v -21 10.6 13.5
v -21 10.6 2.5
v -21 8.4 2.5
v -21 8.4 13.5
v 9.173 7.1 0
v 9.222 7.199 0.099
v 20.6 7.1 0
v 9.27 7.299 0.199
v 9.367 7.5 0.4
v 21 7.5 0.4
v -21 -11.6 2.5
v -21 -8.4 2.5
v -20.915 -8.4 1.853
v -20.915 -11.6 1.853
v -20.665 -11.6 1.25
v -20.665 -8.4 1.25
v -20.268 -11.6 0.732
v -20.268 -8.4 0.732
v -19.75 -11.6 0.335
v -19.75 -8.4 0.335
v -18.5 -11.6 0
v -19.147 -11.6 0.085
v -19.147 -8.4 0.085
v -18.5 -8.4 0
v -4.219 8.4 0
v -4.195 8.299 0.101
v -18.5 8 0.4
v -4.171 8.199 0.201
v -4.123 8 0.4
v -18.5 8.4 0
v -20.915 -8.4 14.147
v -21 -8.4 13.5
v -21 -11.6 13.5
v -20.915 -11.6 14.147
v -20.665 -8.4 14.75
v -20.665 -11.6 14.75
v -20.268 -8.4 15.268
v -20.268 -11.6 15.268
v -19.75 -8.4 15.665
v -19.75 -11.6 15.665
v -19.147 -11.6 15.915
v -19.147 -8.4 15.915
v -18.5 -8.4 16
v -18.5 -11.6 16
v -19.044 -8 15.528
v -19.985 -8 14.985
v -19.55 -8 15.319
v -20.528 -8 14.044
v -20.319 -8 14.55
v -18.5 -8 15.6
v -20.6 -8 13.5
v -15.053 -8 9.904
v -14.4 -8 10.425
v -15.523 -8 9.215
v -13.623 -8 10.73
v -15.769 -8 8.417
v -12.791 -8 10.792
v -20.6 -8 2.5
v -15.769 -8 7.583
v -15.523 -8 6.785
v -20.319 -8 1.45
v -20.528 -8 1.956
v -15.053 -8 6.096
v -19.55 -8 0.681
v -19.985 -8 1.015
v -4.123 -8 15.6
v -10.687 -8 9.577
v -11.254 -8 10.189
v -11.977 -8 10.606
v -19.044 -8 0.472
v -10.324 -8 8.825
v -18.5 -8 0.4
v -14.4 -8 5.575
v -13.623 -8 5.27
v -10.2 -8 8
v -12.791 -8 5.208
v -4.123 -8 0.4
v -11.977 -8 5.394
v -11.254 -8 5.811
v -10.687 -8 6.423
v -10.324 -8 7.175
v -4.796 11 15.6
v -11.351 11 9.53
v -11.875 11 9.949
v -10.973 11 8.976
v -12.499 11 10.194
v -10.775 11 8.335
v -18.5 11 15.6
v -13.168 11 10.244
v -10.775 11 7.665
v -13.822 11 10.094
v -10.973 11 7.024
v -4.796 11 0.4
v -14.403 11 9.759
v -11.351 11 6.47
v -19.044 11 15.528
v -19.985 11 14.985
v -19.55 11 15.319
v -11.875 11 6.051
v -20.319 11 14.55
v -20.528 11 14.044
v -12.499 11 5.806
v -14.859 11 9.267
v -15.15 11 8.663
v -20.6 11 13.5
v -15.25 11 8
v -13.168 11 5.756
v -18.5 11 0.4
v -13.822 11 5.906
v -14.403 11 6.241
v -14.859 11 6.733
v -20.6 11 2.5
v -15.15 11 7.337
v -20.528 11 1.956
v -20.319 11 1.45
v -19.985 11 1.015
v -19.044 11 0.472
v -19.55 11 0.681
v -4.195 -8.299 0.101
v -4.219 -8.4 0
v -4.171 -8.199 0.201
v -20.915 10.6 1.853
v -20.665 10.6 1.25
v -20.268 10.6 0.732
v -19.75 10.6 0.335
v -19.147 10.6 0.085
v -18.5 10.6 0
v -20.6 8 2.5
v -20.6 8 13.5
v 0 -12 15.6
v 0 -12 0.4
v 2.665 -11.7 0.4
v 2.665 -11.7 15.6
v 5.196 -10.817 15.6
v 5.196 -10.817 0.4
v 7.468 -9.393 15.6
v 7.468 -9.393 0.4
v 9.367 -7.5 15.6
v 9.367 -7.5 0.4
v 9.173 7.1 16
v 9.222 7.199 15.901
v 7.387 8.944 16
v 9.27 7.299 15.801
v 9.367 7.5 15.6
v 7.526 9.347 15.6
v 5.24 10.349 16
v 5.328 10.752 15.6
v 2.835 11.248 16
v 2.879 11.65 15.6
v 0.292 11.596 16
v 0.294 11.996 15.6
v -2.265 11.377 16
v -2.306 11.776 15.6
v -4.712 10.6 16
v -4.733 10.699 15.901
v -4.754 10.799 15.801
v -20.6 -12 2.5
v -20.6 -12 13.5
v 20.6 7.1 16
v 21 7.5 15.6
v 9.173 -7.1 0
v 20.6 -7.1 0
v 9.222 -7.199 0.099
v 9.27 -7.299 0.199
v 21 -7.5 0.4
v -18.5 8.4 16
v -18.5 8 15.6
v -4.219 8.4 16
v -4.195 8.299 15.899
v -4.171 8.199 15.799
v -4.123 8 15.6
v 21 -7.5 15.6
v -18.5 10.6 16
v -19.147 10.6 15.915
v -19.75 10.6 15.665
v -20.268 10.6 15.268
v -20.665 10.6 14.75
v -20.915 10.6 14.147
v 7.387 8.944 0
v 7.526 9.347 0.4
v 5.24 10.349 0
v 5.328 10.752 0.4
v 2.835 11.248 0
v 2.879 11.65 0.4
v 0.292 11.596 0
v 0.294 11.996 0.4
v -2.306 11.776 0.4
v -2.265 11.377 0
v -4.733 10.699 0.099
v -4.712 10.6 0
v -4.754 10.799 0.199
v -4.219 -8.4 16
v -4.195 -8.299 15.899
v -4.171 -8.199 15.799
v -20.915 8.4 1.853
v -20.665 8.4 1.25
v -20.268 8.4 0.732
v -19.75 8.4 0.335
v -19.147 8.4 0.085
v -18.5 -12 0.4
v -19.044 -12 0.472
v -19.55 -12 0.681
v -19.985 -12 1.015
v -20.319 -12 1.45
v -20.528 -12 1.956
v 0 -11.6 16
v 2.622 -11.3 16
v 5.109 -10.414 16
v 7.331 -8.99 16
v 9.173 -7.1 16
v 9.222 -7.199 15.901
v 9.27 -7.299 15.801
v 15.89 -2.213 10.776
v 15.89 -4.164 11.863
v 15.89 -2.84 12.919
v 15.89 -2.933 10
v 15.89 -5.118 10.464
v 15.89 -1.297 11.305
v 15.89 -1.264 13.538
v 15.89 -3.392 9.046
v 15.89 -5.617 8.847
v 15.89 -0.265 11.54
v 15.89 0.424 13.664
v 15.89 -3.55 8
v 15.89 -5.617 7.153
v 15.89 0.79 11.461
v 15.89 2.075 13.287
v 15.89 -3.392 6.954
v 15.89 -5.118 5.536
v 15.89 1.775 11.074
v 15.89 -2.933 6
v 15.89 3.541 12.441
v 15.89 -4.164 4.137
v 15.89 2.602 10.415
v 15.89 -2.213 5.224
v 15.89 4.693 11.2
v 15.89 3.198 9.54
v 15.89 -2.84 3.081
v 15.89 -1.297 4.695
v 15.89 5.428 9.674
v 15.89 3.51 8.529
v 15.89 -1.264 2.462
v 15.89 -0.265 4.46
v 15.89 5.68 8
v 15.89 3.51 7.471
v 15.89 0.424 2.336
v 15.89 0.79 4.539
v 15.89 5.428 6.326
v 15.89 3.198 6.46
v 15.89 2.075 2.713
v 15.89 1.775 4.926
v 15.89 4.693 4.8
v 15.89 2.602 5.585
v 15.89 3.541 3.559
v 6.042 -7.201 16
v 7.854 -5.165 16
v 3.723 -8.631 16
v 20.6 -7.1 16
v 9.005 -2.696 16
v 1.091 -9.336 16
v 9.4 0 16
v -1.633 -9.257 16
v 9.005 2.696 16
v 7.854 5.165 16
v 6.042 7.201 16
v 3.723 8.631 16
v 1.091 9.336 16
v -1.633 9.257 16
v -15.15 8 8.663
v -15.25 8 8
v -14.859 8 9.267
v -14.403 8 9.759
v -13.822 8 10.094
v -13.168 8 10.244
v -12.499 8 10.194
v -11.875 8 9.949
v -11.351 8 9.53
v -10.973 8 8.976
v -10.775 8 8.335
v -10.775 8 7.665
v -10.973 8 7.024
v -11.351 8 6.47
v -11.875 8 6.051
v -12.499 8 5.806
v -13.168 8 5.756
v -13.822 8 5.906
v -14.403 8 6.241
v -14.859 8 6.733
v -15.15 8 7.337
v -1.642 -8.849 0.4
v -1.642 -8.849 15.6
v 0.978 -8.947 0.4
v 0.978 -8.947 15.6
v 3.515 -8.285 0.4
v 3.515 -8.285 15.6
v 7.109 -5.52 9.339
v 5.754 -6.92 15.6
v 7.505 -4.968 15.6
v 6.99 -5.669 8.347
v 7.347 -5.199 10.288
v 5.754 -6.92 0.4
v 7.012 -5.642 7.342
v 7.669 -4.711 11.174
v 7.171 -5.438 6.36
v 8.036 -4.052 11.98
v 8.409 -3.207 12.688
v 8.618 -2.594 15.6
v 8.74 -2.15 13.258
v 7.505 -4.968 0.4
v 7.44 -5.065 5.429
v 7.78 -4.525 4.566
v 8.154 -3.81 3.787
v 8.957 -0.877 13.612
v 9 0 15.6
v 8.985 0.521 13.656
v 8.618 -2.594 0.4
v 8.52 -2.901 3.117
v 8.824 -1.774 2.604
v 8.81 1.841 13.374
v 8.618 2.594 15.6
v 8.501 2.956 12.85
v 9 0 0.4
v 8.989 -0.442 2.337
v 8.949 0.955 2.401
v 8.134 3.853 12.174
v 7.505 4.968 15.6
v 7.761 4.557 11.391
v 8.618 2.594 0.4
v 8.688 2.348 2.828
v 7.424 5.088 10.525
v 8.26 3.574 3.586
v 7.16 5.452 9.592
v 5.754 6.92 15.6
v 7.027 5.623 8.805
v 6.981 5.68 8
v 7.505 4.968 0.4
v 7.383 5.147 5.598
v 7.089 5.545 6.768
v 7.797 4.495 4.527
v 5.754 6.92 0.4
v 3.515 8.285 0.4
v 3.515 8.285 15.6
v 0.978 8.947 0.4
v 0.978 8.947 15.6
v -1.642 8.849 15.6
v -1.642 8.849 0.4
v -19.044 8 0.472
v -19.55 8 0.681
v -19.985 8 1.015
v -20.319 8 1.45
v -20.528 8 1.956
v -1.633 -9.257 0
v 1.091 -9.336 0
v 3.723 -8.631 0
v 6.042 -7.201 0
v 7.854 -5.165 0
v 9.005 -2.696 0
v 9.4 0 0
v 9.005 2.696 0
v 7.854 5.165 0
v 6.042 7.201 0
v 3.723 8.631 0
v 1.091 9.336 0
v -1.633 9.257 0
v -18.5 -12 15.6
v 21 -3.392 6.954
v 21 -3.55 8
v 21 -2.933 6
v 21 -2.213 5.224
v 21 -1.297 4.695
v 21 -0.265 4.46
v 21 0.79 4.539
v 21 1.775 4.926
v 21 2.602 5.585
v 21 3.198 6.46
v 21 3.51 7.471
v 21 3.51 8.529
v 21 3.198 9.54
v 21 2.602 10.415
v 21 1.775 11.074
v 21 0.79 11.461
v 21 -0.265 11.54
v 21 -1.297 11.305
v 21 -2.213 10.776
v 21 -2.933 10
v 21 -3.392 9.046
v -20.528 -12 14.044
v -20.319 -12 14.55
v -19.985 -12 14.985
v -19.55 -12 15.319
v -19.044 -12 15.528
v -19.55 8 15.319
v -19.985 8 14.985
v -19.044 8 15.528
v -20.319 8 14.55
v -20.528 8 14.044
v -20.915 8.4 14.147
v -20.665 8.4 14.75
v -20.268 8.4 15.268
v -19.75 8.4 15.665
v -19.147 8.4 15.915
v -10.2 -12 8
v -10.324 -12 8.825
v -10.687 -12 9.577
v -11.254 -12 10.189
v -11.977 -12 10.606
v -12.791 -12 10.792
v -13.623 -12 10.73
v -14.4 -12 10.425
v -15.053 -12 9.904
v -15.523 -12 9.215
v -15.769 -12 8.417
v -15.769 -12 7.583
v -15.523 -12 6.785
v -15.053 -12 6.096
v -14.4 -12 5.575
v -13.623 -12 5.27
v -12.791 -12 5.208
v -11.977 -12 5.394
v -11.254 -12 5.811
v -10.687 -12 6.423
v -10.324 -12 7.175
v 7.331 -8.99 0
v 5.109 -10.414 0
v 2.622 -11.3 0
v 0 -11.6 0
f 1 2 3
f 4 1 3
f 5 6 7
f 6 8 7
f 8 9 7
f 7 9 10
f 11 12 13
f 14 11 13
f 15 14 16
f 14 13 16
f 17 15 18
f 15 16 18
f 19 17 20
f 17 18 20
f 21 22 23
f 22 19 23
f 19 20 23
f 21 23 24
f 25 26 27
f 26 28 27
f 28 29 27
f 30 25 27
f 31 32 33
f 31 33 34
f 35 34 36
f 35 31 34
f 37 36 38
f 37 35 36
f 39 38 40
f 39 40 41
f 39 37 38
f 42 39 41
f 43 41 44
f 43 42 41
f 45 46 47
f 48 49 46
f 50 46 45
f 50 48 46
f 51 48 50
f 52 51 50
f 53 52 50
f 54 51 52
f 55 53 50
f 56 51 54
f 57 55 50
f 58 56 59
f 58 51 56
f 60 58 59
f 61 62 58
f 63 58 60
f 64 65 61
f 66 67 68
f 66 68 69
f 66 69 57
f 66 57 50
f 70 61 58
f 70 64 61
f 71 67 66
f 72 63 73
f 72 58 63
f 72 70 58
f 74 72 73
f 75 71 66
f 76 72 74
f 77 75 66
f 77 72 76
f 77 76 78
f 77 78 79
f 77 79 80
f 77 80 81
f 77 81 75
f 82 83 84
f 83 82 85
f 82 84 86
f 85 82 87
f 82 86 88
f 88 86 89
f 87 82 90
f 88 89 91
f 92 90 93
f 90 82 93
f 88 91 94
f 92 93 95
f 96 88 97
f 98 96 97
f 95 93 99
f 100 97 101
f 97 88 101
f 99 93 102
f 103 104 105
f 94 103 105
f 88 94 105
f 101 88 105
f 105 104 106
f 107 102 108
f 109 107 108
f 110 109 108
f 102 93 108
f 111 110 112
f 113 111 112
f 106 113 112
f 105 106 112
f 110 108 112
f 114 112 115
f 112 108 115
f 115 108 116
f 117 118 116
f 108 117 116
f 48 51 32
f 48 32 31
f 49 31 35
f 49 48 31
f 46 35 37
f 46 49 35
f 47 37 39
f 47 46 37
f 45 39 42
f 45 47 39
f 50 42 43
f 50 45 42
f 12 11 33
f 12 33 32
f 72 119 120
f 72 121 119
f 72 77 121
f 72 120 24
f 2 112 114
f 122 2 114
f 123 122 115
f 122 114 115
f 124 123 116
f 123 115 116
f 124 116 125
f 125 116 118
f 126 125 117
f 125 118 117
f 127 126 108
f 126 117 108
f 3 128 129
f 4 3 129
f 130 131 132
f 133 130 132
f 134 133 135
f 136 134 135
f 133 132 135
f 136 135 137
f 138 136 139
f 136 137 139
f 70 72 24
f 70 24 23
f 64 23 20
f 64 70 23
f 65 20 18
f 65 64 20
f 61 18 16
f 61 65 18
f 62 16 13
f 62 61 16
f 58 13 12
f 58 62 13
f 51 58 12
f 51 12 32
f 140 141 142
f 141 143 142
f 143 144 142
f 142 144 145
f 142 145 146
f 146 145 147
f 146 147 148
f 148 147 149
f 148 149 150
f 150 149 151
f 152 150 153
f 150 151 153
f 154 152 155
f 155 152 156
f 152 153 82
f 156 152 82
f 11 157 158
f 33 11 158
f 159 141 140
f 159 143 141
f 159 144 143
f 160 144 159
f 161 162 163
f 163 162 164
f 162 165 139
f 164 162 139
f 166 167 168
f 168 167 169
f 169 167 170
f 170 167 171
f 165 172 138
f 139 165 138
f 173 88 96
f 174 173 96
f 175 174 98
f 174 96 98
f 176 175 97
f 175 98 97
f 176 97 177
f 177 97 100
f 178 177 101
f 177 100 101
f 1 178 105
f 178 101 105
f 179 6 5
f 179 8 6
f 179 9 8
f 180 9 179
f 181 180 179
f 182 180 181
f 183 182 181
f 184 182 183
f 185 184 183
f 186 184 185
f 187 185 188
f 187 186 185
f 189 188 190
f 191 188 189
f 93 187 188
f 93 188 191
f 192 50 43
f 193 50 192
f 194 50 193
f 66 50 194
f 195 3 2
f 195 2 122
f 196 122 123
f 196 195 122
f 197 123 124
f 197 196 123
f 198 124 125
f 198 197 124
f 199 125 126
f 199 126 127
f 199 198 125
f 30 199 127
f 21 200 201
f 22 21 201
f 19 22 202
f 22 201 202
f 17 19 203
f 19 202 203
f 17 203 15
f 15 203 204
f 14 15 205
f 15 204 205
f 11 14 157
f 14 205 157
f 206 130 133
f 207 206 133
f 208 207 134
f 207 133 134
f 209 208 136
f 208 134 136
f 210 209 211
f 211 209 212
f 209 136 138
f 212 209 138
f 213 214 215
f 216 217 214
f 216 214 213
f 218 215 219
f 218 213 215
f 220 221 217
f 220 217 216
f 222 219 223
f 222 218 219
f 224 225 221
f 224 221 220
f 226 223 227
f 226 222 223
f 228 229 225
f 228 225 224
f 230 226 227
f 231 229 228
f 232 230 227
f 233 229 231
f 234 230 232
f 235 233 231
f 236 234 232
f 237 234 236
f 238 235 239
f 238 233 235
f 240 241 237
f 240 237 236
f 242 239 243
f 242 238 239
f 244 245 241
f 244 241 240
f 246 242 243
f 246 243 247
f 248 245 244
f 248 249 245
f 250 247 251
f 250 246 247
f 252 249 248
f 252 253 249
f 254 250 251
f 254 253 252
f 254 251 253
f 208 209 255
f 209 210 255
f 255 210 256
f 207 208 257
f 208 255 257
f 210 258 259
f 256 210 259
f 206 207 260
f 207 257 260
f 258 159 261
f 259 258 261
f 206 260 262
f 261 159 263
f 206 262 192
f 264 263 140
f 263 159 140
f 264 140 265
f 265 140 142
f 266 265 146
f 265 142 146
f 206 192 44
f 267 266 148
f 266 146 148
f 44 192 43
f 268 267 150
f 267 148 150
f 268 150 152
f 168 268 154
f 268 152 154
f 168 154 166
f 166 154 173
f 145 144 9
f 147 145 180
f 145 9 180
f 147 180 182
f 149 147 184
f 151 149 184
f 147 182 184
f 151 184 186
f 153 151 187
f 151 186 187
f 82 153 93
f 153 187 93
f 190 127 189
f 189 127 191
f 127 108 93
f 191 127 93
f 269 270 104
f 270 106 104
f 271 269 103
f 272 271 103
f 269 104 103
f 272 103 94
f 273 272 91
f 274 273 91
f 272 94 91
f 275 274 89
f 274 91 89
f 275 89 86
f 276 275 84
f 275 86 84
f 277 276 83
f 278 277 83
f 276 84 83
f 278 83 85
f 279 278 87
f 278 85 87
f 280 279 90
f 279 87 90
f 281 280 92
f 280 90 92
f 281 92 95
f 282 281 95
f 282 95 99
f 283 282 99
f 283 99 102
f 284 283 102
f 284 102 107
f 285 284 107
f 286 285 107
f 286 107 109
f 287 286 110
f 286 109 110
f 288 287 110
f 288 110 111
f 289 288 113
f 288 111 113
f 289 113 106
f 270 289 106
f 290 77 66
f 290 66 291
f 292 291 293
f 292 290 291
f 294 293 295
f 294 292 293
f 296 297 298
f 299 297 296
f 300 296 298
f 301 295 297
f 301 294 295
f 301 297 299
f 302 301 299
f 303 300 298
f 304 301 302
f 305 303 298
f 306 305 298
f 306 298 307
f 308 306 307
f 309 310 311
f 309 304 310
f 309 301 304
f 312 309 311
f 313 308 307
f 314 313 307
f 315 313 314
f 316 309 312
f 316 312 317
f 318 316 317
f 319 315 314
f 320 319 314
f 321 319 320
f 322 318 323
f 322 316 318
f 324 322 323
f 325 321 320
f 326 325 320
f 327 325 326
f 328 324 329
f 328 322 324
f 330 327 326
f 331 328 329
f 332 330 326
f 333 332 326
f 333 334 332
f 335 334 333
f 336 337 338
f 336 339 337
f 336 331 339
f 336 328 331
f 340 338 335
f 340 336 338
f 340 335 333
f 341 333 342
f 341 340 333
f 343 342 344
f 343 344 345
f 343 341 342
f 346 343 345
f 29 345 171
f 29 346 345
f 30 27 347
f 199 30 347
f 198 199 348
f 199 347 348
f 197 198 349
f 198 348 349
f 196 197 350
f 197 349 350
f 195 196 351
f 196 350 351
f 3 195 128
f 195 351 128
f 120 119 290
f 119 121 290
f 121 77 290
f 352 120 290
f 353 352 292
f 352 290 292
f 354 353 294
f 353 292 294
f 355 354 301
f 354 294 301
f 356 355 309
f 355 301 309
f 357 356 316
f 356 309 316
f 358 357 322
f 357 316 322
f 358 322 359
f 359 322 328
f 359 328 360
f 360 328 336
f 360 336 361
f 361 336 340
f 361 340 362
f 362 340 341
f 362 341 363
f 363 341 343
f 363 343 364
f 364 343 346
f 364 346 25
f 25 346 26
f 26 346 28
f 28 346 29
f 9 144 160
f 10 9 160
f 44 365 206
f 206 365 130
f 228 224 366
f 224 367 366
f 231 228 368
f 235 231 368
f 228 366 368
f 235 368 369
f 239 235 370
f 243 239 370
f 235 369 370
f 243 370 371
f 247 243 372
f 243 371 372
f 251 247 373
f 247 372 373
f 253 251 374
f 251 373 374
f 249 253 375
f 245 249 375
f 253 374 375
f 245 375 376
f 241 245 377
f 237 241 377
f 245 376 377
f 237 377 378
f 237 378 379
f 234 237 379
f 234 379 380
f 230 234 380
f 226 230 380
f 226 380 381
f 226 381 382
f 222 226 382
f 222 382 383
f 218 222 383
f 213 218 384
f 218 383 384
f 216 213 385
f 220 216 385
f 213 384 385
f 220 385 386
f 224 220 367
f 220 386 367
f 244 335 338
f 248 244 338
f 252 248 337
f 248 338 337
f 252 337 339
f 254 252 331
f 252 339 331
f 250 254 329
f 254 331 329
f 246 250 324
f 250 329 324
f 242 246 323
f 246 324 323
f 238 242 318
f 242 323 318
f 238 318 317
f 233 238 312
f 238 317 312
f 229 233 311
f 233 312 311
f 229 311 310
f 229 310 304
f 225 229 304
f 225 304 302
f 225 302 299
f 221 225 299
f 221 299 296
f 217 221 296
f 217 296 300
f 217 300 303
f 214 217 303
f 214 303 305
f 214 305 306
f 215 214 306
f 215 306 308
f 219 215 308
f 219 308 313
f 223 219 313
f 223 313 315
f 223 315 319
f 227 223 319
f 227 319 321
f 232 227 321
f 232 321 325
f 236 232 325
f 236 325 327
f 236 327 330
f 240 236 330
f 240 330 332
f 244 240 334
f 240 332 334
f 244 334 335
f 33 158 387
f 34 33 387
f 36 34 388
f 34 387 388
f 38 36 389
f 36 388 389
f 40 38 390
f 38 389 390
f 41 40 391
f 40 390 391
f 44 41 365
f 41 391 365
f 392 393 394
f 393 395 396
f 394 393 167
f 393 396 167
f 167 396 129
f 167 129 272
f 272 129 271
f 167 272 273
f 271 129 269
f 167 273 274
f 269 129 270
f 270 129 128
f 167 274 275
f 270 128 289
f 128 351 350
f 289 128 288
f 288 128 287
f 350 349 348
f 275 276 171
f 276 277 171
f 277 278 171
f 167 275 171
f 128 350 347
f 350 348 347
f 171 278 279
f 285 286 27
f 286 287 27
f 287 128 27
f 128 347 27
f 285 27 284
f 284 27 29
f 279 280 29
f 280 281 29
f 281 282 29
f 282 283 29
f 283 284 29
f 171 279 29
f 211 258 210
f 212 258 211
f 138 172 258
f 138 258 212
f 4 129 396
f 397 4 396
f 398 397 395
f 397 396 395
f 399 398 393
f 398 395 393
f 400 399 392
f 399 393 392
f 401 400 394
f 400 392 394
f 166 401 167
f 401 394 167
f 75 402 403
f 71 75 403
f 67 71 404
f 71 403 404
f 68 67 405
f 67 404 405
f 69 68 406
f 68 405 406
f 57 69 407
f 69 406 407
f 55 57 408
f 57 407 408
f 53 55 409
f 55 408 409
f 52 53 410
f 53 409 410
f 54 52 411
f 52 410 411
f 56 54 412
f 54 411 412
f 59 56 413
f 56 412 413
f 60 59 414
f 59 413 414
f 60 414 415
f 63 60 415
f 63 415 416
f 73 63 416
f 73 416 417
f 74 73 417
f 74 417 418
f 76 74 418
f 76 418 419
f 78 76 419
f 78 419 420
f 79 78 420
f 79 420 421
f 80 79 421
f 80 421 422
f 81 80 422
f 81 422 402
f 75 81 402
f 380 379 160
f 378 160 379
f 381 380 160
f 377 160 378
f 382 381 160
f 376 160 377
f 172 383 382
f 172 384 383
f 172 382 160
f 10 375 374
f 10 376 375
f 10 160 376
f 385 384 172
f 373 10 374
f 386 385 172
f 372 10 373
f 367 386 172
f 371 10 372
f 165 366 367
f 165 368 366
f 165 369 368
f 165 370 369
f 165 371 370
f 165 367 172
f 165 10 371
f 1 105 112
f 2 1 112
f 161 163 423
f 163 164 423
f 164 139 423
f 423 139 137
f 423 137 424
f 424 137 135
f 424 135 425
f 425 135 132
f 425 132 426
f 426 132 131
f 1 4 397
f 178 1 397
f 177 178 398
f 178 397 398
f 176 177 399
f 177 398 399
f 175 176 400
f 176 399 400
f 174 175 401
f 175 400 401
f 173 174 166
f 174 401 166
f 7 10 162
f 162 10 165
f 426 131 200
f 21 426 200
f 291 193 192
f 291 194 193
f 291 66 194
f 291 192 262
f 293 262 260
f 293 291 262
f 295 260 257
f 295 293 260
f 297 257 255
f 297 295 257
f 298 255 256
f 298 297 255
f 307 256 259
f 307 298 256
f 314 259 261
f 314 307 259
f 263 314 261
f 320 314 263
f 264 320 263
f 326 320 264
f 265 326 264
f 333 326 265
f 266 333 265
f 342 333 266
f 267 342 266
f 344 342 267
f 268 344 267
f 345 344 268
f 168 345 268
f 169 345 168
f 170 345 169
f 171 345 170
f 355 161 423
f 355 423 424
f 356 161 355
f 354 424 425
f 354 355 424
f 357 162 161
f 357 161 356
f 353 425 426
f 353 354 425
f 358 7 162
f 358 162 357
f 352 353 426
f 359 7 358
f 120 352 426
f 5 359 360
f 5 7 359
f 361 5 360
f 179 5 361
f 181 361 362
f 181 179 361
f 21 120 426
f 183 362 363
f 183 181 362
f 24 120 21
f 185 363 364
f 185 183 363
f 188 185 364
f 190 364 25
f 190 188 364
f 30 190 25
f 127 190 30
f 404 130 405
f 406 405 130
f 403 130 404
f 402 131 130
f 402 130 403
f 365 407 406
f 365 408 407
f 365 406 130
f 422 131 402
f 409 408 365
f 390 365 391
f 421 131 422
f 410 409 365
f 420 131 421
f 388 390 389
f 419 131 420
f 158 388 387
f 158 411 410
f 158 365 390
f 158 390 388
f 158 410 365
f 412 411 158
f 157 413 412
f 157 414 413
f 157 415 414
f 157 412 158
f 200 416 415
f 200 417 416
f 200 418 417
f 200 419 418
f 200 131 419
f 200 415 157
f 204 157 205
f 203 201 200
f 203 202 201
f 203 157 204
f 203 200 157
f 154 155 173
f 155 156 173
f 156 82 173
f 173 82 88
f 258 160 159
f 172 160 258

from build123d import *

# Parameters (mm, degrees)
PAD004_DEPTH        = 16
FILLET003_R         = 2.5
HOLE003_D           = 4.5
HOLE003_CBORE_D     = 5.6
HOLE003_CBORE_DEPTH = 4.4
HOLE004_D           = 7.1
HOLE004_CBORE_D     = 11.36
HOLE004_CBORE_DEPTH = 15.89
CHAMFER006_SIZE     = 0.4


with BuildPart() as part:
    # Sketch017 → Pad004 (new body)
    with BuildSketch(Plane.XY):
        with BuildLine():
            Line((9.367497, 7.5), (21, 7.5))
            Line((21, 7.5), (21, -7.5))
            Line((21, -7.5), (9.367497, -7.5))
            ThreePointArc((0, -12), (5.196152, -10.816654), (9.367497, -7.5))
            Line((0, -12), (-21, -12))
            Line((-21, -12), (-21, -8))
            Line((-21, -8), (-4.123106, -8))
            ThreePointArc((-4.123106, -8), (9, 0), (-4.123106, 8))
            Line((-21, 8), (-4.123106, 8))
            Line((-21, 11), (-21, 8))
            Line((-4.795832, 11), (-21, 11))
            ThreePointArc((9.367497, 7.5), (2.878807, 11.649569), (-4.795832, 11))
        make_face()
    extrude(amount=PAD004_DEPTH)

    # Fillet003
    fillet003_edges = [part.edges().sort_by_distance(p)[0] for p in [
        (-21, -10, 16),
        (-21, 9.5, 16),
        (-21, 9.5, 0),
        (-21, -10, 0),
    ]]
    fillet(fillet003_edges, radius=FILLET003_R)

    # Hole003 (through all)
    with Locations(Plane.XZ.offset(12)):
        with Locations((-13, 8)):
            CounterBoreHole(HOLE003_D / 2, HOLE003_CBORE_D / 2, HOLE003_CBORE_DEPTH)

    # Hole004 (through all)
    with Locations(Plane(origin=(0, 0, 0), x_dir=(0, 1, 0), z_dir=(-1, 0, 0))):
        with Locations((0, -8)):
            CounterBoreHole(HOLE004_D / 2, HOLE004_CBORE_D / 2, HOLE004_CBORE_DEPTH)

    # Chamfer006
    chamfer006_edges = [part.edges().sort_by_distance(p)[0] for p in [
        (21, 0, 16),
        (15.183748, 7.5, 16),
        (15.183748, -7.5, 16),
        (5.196152, -10.816654, 16),
        (9, 0, 16),
        (2.878807, 11.649569, 16),
        (-11.647916, 11, 16),
        (-11.311553, 8, 16),
        (-11.311553, -8, 16),
        (-9.25, -12, 16),
        (15.183748, 7.5, 0),
        (21, 0, 0),
        (2.878807, 11.649569, 0),
        (9, 0, 0),
        (-11.647916, 11, 0),
        (-11.311553, 8, 0),
        (15.183748, -7.5, 0),
        (5.196152, -10.816654, 0),
        (-9.25, -12, 0),
        (-11.311553, -8, 0),
    ]]
    chamfer(chamfer006_edges, length=CHAMFER006_SIZE)


solid = part.part
